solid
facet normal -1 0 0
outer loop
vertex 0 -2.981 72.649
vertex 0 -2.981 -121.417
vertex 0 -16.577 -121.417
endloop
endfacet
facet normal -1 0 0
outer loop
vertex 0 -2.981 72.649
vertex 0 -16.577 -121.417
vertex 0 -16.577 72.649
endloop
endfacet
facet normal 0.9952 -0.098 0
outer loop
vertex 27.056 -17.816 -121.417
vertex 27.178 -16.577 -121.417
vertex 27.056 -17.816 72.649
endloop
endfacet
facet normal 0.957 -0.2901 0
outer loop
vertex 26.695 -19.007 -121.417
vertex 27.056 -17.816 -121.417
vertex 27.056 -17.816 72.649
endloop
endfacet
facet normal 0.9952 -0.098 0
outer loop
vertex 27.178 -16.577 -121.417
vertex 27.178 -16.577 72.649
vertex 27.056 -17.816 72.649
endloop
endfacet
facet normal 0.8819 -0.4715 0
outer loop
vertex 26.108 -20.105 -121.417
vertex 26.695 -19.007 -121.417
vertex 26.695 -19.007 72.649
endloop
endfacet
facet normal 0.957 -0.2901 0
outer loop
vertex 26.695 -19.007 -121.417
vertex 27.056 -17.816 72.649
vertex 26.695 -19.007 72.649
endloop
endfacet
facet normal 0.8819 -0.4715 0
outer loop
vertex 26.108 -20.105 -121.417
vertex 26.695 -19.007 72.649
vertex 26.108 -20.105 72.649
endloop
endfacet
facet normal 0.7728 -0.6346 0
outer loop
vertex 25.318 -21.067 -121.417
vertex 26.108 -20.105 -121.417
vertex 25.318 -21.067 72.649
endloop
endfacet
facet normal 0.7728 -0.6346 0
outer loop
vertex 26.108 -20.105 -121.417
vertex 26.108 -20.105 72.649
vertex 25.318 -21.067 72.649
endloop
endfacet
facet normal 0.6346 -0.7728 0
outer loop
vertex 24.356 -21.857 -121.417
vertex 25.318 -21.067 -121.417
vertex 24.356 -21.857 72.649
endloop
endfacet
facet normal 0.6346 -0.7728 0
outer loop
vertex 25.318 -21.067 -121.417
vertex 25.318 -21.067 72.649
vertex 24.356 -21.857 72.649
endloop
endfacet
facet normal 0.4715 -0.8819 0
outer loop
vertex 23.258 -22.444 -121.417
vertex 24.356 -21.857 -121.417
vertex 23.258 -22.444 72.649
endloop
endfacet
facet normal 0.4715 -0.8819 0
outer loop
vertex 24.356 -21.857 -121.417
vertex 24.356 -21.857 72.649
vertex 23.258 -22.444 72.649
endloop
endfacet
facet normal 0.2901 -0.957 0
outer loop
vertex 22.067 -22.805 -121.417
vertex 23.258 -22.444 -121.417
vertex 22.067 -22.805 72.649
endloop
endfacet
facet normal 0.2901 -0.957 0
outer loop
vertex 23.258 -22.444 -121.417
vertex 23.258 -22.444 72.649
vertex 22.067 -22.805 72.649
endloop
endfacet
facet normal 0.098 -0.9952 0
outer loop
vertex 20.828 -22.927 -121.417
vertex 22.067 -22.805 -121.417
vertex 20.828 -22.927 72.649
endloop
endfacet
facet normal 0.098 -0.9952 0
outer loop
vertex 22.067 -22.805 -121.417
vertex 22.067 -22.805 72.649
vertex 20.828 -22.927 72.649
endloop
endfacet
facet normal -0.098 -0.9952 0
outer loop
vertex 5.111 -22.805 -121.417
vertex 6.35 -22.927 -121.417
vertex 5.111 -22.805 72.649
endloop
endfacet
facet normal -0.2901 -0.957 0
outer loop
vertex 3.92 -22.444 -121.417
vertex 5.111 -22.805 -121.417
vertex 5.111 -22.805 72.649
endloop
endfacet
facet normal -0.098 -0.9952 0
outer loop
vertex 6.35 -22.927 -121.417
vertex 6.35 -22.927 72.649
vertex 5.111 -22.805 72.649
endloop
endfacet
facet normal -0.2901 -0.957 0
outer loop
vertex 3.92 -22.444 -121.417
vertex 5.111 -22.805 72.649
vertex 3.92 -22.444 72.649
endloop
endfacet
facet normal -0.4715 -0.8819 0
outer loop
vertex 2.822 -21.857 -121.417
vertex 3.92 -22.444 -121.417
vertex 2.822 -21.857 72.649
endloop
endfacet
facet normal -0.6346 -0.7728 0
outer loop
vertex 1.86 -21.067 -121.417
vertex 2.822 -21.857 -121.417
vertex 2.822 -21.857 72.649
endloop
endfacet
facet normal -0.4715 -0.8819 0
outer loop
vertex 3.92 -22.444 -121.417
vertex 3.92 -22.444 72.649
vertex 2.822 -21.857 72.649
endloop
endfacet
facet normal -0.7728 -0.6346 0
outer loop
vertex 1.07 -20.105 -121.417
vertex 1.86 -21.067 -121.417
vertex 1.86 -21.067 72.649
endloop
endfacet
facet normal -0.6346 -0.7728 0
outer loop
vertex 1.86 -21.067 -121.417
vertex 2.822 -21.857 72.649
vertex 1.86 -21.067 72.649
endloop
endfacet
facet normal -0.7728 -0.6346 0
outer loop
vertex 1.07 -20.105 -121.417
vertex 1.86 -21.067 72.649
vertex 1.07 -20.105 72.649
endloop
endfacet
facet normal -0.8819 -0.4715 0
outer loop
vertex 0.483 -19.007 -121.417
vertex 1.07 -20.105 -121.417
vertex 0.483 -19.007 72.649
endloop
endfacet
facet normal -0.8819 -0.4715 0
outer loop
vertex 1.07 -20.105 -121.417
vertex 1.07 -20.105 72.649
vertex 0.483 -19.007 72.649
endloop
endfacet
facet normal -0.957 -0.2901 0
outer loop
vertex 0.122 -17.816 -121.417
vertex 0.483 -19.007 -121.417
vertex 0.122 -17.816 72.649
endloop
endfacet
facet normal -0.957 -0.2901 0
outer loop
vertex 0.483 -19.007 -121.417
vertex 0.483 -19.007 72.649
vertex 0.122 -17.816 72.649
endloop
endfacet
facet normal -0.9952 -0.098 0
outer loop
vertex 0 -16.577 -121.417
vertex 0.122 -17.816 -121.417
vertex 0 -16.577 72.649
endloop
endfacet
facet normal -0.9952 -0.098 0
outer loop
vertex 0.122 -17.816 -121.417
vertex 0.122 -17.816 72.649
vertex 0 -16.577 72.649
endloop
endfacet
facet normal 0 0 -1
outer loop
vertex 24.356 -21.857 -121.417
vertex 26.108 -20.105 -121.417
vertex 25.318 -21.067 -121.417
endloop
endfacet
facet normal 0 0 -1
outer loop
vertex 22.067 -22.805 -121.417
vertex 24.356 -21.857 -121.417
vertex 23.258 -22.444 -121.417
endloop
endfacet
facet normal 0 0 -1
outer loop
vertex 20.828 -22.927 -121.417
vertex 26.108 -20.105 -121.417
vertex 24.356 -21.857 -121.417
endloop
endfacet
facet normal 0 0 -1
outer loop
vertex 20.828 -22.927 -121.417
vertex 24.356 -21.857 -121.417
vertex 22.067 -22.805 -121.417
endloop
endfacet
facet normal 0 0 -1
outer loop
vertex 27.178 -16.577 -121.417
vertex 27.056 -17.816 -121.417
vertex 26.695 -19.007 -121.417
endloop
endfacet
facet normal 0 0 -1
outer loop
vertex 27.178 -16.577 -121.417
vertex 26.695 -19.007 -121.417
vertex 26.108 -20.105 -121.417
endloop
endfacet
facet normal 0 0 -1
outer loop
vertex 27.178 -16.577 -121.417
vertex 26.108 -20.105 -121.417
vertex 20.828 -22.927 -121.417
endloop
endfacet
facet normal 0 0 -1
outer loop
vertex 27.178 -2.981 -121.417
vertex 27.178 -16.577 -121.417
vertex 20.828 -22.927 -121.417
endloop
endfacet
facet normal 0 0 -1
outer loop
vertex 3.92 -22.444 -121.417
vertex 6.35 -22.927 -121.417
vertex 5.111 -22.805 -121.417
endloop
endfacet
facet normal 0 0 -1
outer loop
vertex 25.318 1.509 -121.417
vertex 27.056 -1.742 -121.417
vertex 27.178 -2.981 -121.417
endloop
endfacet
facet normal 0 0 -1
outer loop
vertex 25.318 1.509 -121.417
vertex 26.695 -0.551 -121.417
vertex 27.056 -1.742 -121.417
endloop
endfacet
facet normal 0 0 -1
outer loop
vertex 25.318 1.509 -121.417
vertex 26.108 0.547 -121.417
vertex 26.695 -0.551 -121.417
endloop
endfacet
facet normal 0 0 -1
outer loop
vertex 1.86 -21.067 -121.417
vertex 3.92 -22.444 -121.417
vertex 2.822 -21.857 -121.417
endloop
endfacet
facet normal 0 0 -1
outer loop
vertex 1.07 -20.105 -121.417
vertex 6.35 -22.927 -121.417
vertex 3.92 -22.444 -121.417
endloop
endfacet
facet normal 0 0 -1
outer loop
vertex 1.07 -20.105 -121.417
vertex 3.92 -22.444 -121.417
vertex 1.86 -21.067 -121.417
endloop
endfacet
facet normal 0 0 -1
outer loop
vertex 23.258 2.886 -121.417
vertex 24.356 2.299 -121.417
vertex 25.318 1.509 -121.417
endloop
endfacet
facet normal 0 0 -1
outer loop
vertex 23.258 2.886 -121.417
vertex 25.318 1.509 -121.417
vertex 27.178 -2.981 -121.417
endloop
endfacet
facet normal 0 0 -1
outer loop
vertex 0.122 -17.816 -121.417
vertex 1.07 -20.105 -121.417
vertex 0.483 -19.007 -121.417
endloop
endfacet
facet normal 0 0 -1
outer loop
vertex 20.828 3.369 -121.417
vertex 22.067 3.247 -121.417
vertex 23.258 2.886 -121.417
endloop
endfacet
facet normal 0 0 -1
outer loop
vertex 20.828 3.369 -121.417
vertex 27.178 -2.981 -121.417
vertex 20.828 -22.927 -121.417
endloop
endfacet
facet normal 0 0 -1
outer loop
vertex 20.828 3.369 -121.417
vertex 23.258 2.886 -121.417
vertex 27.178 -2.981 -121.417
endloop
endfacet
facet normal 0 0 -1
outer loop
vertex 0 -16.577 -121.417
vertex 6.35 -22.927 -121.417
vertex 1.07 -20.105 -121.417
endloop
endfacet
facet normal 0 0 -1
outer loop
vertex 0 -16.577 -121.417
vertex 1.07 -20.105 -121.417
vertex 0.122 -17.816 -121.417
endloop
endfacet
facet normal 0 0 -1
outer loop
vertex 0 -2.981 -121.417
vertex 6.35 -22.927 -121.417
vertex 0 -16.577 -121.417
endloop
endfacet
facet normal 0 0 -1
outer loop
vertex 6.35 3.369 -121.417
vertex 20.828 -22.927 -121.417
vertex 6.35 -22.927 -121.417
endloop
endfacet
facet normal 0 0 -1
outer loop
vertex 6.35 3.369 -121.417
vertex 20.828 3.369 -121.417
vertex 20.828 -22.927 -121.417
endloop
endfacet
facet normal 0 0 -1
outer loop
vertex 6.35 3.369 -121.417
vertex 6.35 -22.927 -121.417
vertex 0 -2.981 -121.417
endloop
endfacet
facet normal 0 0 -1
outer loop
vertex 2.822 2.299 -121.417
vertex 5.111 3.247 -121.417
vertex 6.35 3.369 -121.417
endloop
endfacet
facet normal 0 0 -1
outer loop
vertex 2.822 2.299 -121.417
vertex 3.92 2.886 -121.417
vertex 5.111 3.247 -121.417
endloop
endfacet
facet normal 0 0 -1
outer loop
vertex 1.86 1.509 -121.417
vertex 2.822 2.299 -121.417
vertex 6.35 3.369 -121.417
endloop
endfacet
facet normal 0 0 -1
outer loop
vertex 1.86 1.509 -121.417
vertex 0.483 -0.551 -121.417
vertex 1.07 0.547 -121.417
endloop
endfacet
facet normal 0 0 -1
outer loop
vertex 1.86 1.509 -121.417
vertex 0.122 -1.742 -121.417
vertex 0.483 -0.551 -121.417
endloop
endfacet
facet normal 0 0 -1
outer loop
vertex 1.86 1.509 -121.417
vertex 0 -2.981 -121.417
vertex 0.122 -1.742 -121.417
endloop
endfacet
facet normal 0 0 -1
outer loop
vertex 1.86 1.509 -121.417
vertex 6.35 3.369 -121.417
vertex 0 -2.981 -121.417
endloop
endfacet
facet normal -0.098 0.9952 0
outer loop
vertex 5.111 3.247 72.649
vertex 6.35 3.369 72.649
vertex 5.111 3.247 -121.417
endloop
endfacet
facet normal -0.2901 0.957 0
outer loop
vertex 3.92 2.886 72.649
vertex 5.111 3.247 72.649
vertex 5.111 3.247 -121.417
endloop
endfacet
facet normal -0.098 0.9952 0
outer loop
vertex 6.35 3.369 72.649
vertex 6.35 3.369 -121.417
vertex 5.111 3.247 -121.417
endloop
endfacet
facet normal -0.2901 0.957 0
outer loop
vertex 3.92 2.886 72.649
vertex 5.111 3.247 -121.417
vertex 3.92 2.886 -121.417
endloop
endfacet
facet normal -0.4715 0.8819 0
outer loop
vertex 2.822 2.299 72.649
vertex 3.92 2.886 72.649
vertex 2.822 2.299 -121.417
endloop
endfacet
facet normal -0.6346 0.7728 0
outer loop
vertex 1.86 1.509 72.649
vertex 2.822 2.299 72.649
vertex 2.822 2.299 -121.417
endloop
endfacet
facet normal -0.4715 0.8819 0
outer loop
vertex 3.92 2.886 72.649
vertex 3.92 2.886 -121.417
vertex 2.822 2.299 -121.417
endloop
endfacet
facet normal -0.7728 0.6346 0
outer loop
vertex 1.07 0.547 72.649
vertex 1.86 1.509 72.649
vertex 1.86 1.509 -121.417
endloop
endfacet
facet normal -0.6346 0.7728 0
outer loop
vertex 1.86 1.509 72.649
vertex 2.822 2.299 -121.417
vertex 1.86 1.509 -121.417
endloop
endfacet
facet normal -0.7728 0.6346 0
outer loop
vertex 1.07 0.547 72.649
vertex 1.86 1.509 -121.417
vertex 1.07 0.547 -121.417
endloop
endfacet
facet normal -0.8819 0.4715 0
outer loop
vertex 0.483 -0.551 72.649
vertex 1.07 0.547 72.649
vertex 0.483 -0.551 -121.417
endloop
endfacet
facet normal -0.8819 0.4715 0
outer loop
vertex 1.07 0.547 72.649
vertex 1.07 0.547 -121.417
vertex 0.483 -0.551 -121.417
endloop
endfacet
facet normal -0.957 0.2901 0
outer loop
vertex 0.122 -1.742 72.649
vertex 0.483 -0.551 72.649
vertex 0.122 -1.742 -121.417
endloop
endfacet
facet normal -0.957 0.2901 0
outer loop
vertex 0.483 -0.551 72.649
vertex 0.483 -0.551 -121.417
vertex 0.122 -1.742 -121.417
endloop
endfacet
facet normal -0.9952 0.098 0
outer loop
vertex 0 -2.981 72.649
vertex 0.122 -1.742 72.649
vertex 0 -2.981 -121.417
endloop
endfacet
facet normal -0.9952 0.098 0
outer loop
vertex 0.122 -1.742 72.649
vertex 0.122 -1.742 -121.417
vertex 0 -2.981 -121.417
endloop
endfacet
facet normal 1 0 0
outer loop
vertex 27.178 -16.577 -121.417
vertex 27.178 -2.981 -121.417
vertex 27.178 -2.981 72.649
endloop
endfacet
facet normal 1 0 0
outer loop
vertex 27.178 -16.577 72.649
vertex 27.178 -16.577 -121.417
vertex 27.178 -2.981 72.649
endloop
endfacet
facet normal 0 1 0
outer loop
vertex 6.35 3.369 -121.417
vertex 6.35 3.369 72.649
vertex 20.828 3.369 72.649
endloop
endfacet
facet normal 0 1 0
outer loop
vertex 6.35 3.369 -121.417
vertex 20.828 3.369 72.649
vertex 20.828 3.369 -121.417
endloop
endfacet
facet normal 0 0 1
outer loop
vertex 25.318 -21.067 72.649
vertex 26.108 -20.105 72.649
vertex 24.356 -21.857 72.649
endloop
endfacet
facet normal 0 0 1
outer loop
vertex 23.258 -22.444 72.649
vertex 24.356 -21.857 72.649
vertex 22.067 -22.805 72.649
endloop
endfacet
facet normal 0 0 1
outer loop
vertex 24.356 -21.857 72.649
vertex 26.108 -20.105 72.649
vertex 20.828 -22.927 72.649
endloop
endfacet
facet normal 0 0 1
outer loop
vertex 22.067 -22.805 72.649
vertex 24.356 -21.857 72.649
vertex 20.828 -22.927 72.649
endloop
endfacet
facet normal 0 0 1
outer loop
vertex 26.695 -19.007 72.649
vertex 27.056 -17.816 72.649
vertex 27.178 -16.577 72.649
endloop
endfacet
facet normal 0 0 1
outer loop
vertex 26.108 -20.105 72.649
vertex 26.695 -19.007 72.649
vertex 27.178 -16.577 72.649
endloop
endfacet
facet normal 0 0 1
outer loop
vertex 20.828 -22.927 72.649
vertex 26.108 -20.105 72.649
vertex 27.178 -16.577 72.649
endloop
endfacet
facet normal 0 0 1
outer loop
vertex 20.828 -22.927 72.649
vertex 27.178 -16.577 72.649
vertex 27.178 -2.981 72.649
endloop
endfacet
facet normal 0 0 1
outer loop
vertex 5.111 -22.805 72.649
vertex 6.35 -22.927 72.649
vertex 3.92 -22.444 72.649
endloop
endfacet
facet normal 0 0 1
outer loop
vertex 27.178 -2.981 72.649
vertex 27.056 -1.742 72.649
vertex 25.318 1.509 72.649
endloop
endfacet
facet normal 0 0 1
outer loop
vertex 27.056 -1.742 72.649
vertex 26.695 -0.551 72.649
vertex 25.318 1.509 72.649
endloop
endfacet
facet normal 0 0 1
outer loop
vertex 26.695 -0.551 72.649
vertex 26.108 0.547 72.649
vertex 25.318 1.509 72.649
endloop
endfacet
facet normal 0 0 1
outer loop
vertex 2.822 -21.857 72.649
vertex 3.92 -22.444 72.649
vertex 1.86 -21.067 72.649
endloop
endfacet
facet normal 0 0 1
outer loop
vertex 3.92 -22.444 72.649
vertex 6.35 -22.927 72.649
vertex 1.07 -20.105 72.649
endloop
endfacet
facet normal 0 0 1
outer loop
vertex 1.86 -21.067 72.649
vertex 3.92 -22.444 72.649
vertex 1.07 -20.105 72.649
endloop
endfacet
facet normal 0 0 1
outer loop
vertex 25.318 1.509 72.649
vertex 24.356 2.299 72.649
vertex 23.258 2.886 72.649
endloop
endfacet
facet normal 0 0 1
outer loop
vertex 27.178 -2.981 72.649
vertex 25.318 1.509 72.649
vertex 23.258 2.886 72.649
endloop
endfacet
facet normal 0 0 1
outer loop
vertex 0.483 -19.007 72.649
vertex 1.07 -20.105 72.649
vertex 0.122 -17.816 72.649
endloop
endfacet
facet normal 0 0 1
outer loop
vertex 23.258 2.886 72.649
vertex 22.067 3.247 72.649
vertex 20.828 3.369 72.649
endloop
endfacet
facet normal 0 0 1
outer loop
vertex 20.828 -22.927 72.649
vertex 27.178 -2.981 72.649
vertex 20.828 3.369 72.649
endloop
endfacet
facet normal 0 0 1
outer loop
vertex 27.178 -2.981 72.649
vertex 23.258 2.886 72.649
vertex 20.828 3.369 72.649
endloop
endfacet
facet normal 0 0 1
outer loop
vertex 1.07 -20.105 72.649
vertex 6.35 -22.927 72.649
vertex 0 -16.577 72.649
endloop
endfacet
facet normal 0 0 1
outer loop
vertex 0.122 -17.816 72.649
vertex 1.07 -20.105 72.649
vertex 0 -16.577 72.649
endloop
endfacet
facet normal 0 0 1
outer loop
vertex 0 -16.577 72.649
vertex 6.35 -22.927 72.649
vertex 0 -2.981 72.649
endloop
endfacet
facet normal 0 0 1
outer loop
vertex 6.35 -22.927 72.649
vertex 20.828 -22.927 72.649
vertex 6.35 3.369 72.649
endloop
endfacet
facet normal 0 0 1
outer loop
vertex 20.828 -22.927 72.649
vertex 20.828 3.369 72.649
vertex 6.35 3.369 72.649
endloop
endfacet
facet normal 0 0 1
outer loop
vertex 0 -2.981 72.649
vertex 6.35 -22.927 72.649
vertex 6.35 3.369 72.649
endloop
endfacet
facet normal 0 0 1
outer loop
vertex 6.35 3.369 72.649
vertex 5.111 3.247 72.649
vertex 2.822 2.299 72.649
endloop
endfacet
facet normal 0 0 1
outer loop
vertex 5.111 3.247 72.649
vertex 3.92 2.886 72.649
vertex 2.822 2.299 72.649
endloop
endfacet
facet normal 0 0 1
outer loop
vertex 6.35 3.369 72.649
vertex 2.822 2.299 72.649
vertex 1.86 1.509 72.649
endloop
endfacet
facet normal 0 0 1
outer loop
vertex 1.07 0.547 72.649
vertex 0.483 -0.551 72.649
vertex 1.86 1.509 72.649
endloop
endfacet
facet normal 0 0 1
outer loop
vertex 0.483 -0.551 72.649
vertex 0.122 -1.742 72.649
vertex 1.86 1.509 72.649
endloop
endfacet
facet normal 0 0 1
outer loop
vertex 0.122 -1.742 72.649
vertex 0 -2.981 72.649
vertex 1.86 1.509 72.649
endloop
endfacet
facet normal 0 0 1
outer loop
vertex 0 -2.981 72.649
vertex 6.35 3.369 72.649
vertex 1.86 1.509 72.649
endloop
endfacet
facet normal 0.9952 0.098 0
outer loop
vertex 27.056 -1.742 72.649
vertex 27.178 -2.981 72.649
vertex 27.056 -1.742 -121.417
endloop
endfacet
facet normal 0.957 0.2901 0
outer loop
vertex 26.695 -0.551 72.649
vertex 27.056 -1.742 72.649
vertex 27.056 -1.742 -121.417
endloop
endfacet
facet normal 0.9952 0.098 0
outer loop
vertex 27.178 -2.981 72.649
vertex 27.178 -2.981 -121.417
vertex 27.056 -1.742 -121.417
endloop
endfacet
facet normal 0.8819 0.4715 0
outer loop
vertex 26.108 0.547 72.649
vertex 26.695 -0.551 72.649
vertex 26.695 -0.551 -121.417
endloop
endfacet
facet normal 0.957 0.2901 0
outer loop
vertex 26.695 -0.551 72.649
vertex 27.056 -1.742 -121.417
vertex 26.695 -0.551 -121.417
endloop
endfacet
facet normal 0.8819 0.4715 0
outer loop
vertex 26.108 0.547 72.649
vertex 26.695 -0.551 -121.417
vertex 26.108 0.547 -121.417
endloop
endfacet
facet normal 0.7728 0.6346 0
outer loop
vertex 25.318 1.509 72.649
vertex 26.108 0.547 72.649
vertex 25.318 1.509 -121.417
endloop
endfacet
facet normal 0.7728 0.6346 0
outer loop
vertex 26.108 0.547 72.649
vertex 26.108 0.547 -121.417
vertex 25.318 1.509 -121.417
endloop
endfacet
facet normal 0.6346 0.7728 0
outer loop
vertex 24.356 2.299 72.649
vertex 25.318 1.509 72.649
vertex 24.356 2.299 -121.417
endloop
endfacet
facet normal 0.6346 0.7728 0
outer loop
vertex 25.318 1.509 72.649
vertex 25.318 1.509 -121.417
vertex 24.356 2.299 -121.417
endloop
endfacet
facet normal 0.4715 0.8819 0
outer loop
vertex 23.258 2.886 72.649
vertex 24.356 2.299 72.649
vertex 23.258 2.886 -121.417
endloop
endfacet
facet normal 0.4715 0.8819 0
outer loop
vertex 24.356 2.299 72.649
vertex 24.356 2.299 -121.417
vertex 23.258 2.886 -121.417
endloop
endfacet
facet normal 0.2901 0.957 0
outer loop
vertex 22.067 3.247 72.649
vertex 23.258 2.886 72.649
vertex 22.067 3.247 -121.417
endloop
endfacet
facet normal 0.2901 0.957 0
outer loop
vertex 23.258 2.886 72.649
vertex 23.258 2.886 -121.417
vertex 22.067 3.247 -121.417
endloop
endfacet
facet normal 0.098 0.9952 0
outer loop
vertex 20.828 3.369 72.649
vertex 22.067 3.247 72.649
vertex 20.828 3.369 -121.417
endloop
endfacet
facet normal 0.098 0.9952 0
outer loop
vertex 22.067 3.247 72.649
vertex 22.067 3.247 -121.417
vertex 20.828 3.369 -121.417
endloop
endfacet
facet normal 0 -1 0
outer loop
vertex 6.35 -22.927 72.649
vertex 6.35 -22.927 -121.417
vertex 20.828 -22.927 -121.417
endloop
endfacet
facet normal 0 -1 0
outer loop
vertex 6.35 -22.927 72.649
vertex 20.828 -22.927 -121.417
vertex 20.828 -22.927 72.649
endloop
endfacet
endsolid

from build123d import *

# Parameters (mm, degrees)
F0_W     = 6.7386771552
F0_H     = 145.2977508307
F1_DEPTH = 9.652
F2_DEPTH = 3.302
F3_DEPTH = 48.768
F4_DEPTH = 17.526
F5_DEPTH = 16.256
F6_R     = 6.35
F7_R     = 6.35
F8_R     = 6.35


with BuildPart() as f1:
    # F0 (on Right) → F1 (new body)
    with BuildSketch(Plane.YZ):
        Rectangle(F0_W, F0_H)
    extrude(amount=F1_DEPTH)

    # F2 (add): a face of the model
    f2_faces = [f1.faces().sort_by_distance(p)[0] for p in [
        (4.826, -3.3693385776, 0),
    ]]
    extrude(f2_faces, amount=F2_DEPTH)

    # F3 (add): a face of the model
    f3_faces = [f1.faces().sort_by_distance(p)[0] for p in [
        (4.826, -1.651, -72.6488754153),
    ]]
    extrude(f3_faces, amount=F3_DEPTH)

    # F4 (add): a face of the model
    f4_faces = [f1.faces().sort_by_distance(p)[0] for p in [
        (9.652, -1.651, -24.384),
    ]]
    extrude(f4_faces, amount=F4_DEPTH)

    # F5 (add): a face of the model
    f5_faces = [f1.faces().sort_by_distance(p)[0] for p in [
        (13.589, -6.6713385776, -24.384),
    ]]
    extrude(f5_faces, amount=F5_DEPTH)

    # F6
    f6_edges = [f1.edges().sort_by_distance(p)[0] for p in [
        (27.178, -22.927339, -24.384),
    ]]
    fillet(f6_edges, radius=F6_R)

    # F7
    f7_edges = [f1.edges().sort_by_distance(p)[0] for p in [
        (27.178, 3.369339, -24.384),
    ]]
    fillet(f7_edges, radius=F7_R)

    # F8
    f8_edges = [f1.edges().sort_by_distance(p)[0] for p in [
        (0, -22.927339, -24.384),
        (0, 3.369339, -24.384),
    ]]
    fillet(f8_edges, radius=F8_R)


solid = f1.part
